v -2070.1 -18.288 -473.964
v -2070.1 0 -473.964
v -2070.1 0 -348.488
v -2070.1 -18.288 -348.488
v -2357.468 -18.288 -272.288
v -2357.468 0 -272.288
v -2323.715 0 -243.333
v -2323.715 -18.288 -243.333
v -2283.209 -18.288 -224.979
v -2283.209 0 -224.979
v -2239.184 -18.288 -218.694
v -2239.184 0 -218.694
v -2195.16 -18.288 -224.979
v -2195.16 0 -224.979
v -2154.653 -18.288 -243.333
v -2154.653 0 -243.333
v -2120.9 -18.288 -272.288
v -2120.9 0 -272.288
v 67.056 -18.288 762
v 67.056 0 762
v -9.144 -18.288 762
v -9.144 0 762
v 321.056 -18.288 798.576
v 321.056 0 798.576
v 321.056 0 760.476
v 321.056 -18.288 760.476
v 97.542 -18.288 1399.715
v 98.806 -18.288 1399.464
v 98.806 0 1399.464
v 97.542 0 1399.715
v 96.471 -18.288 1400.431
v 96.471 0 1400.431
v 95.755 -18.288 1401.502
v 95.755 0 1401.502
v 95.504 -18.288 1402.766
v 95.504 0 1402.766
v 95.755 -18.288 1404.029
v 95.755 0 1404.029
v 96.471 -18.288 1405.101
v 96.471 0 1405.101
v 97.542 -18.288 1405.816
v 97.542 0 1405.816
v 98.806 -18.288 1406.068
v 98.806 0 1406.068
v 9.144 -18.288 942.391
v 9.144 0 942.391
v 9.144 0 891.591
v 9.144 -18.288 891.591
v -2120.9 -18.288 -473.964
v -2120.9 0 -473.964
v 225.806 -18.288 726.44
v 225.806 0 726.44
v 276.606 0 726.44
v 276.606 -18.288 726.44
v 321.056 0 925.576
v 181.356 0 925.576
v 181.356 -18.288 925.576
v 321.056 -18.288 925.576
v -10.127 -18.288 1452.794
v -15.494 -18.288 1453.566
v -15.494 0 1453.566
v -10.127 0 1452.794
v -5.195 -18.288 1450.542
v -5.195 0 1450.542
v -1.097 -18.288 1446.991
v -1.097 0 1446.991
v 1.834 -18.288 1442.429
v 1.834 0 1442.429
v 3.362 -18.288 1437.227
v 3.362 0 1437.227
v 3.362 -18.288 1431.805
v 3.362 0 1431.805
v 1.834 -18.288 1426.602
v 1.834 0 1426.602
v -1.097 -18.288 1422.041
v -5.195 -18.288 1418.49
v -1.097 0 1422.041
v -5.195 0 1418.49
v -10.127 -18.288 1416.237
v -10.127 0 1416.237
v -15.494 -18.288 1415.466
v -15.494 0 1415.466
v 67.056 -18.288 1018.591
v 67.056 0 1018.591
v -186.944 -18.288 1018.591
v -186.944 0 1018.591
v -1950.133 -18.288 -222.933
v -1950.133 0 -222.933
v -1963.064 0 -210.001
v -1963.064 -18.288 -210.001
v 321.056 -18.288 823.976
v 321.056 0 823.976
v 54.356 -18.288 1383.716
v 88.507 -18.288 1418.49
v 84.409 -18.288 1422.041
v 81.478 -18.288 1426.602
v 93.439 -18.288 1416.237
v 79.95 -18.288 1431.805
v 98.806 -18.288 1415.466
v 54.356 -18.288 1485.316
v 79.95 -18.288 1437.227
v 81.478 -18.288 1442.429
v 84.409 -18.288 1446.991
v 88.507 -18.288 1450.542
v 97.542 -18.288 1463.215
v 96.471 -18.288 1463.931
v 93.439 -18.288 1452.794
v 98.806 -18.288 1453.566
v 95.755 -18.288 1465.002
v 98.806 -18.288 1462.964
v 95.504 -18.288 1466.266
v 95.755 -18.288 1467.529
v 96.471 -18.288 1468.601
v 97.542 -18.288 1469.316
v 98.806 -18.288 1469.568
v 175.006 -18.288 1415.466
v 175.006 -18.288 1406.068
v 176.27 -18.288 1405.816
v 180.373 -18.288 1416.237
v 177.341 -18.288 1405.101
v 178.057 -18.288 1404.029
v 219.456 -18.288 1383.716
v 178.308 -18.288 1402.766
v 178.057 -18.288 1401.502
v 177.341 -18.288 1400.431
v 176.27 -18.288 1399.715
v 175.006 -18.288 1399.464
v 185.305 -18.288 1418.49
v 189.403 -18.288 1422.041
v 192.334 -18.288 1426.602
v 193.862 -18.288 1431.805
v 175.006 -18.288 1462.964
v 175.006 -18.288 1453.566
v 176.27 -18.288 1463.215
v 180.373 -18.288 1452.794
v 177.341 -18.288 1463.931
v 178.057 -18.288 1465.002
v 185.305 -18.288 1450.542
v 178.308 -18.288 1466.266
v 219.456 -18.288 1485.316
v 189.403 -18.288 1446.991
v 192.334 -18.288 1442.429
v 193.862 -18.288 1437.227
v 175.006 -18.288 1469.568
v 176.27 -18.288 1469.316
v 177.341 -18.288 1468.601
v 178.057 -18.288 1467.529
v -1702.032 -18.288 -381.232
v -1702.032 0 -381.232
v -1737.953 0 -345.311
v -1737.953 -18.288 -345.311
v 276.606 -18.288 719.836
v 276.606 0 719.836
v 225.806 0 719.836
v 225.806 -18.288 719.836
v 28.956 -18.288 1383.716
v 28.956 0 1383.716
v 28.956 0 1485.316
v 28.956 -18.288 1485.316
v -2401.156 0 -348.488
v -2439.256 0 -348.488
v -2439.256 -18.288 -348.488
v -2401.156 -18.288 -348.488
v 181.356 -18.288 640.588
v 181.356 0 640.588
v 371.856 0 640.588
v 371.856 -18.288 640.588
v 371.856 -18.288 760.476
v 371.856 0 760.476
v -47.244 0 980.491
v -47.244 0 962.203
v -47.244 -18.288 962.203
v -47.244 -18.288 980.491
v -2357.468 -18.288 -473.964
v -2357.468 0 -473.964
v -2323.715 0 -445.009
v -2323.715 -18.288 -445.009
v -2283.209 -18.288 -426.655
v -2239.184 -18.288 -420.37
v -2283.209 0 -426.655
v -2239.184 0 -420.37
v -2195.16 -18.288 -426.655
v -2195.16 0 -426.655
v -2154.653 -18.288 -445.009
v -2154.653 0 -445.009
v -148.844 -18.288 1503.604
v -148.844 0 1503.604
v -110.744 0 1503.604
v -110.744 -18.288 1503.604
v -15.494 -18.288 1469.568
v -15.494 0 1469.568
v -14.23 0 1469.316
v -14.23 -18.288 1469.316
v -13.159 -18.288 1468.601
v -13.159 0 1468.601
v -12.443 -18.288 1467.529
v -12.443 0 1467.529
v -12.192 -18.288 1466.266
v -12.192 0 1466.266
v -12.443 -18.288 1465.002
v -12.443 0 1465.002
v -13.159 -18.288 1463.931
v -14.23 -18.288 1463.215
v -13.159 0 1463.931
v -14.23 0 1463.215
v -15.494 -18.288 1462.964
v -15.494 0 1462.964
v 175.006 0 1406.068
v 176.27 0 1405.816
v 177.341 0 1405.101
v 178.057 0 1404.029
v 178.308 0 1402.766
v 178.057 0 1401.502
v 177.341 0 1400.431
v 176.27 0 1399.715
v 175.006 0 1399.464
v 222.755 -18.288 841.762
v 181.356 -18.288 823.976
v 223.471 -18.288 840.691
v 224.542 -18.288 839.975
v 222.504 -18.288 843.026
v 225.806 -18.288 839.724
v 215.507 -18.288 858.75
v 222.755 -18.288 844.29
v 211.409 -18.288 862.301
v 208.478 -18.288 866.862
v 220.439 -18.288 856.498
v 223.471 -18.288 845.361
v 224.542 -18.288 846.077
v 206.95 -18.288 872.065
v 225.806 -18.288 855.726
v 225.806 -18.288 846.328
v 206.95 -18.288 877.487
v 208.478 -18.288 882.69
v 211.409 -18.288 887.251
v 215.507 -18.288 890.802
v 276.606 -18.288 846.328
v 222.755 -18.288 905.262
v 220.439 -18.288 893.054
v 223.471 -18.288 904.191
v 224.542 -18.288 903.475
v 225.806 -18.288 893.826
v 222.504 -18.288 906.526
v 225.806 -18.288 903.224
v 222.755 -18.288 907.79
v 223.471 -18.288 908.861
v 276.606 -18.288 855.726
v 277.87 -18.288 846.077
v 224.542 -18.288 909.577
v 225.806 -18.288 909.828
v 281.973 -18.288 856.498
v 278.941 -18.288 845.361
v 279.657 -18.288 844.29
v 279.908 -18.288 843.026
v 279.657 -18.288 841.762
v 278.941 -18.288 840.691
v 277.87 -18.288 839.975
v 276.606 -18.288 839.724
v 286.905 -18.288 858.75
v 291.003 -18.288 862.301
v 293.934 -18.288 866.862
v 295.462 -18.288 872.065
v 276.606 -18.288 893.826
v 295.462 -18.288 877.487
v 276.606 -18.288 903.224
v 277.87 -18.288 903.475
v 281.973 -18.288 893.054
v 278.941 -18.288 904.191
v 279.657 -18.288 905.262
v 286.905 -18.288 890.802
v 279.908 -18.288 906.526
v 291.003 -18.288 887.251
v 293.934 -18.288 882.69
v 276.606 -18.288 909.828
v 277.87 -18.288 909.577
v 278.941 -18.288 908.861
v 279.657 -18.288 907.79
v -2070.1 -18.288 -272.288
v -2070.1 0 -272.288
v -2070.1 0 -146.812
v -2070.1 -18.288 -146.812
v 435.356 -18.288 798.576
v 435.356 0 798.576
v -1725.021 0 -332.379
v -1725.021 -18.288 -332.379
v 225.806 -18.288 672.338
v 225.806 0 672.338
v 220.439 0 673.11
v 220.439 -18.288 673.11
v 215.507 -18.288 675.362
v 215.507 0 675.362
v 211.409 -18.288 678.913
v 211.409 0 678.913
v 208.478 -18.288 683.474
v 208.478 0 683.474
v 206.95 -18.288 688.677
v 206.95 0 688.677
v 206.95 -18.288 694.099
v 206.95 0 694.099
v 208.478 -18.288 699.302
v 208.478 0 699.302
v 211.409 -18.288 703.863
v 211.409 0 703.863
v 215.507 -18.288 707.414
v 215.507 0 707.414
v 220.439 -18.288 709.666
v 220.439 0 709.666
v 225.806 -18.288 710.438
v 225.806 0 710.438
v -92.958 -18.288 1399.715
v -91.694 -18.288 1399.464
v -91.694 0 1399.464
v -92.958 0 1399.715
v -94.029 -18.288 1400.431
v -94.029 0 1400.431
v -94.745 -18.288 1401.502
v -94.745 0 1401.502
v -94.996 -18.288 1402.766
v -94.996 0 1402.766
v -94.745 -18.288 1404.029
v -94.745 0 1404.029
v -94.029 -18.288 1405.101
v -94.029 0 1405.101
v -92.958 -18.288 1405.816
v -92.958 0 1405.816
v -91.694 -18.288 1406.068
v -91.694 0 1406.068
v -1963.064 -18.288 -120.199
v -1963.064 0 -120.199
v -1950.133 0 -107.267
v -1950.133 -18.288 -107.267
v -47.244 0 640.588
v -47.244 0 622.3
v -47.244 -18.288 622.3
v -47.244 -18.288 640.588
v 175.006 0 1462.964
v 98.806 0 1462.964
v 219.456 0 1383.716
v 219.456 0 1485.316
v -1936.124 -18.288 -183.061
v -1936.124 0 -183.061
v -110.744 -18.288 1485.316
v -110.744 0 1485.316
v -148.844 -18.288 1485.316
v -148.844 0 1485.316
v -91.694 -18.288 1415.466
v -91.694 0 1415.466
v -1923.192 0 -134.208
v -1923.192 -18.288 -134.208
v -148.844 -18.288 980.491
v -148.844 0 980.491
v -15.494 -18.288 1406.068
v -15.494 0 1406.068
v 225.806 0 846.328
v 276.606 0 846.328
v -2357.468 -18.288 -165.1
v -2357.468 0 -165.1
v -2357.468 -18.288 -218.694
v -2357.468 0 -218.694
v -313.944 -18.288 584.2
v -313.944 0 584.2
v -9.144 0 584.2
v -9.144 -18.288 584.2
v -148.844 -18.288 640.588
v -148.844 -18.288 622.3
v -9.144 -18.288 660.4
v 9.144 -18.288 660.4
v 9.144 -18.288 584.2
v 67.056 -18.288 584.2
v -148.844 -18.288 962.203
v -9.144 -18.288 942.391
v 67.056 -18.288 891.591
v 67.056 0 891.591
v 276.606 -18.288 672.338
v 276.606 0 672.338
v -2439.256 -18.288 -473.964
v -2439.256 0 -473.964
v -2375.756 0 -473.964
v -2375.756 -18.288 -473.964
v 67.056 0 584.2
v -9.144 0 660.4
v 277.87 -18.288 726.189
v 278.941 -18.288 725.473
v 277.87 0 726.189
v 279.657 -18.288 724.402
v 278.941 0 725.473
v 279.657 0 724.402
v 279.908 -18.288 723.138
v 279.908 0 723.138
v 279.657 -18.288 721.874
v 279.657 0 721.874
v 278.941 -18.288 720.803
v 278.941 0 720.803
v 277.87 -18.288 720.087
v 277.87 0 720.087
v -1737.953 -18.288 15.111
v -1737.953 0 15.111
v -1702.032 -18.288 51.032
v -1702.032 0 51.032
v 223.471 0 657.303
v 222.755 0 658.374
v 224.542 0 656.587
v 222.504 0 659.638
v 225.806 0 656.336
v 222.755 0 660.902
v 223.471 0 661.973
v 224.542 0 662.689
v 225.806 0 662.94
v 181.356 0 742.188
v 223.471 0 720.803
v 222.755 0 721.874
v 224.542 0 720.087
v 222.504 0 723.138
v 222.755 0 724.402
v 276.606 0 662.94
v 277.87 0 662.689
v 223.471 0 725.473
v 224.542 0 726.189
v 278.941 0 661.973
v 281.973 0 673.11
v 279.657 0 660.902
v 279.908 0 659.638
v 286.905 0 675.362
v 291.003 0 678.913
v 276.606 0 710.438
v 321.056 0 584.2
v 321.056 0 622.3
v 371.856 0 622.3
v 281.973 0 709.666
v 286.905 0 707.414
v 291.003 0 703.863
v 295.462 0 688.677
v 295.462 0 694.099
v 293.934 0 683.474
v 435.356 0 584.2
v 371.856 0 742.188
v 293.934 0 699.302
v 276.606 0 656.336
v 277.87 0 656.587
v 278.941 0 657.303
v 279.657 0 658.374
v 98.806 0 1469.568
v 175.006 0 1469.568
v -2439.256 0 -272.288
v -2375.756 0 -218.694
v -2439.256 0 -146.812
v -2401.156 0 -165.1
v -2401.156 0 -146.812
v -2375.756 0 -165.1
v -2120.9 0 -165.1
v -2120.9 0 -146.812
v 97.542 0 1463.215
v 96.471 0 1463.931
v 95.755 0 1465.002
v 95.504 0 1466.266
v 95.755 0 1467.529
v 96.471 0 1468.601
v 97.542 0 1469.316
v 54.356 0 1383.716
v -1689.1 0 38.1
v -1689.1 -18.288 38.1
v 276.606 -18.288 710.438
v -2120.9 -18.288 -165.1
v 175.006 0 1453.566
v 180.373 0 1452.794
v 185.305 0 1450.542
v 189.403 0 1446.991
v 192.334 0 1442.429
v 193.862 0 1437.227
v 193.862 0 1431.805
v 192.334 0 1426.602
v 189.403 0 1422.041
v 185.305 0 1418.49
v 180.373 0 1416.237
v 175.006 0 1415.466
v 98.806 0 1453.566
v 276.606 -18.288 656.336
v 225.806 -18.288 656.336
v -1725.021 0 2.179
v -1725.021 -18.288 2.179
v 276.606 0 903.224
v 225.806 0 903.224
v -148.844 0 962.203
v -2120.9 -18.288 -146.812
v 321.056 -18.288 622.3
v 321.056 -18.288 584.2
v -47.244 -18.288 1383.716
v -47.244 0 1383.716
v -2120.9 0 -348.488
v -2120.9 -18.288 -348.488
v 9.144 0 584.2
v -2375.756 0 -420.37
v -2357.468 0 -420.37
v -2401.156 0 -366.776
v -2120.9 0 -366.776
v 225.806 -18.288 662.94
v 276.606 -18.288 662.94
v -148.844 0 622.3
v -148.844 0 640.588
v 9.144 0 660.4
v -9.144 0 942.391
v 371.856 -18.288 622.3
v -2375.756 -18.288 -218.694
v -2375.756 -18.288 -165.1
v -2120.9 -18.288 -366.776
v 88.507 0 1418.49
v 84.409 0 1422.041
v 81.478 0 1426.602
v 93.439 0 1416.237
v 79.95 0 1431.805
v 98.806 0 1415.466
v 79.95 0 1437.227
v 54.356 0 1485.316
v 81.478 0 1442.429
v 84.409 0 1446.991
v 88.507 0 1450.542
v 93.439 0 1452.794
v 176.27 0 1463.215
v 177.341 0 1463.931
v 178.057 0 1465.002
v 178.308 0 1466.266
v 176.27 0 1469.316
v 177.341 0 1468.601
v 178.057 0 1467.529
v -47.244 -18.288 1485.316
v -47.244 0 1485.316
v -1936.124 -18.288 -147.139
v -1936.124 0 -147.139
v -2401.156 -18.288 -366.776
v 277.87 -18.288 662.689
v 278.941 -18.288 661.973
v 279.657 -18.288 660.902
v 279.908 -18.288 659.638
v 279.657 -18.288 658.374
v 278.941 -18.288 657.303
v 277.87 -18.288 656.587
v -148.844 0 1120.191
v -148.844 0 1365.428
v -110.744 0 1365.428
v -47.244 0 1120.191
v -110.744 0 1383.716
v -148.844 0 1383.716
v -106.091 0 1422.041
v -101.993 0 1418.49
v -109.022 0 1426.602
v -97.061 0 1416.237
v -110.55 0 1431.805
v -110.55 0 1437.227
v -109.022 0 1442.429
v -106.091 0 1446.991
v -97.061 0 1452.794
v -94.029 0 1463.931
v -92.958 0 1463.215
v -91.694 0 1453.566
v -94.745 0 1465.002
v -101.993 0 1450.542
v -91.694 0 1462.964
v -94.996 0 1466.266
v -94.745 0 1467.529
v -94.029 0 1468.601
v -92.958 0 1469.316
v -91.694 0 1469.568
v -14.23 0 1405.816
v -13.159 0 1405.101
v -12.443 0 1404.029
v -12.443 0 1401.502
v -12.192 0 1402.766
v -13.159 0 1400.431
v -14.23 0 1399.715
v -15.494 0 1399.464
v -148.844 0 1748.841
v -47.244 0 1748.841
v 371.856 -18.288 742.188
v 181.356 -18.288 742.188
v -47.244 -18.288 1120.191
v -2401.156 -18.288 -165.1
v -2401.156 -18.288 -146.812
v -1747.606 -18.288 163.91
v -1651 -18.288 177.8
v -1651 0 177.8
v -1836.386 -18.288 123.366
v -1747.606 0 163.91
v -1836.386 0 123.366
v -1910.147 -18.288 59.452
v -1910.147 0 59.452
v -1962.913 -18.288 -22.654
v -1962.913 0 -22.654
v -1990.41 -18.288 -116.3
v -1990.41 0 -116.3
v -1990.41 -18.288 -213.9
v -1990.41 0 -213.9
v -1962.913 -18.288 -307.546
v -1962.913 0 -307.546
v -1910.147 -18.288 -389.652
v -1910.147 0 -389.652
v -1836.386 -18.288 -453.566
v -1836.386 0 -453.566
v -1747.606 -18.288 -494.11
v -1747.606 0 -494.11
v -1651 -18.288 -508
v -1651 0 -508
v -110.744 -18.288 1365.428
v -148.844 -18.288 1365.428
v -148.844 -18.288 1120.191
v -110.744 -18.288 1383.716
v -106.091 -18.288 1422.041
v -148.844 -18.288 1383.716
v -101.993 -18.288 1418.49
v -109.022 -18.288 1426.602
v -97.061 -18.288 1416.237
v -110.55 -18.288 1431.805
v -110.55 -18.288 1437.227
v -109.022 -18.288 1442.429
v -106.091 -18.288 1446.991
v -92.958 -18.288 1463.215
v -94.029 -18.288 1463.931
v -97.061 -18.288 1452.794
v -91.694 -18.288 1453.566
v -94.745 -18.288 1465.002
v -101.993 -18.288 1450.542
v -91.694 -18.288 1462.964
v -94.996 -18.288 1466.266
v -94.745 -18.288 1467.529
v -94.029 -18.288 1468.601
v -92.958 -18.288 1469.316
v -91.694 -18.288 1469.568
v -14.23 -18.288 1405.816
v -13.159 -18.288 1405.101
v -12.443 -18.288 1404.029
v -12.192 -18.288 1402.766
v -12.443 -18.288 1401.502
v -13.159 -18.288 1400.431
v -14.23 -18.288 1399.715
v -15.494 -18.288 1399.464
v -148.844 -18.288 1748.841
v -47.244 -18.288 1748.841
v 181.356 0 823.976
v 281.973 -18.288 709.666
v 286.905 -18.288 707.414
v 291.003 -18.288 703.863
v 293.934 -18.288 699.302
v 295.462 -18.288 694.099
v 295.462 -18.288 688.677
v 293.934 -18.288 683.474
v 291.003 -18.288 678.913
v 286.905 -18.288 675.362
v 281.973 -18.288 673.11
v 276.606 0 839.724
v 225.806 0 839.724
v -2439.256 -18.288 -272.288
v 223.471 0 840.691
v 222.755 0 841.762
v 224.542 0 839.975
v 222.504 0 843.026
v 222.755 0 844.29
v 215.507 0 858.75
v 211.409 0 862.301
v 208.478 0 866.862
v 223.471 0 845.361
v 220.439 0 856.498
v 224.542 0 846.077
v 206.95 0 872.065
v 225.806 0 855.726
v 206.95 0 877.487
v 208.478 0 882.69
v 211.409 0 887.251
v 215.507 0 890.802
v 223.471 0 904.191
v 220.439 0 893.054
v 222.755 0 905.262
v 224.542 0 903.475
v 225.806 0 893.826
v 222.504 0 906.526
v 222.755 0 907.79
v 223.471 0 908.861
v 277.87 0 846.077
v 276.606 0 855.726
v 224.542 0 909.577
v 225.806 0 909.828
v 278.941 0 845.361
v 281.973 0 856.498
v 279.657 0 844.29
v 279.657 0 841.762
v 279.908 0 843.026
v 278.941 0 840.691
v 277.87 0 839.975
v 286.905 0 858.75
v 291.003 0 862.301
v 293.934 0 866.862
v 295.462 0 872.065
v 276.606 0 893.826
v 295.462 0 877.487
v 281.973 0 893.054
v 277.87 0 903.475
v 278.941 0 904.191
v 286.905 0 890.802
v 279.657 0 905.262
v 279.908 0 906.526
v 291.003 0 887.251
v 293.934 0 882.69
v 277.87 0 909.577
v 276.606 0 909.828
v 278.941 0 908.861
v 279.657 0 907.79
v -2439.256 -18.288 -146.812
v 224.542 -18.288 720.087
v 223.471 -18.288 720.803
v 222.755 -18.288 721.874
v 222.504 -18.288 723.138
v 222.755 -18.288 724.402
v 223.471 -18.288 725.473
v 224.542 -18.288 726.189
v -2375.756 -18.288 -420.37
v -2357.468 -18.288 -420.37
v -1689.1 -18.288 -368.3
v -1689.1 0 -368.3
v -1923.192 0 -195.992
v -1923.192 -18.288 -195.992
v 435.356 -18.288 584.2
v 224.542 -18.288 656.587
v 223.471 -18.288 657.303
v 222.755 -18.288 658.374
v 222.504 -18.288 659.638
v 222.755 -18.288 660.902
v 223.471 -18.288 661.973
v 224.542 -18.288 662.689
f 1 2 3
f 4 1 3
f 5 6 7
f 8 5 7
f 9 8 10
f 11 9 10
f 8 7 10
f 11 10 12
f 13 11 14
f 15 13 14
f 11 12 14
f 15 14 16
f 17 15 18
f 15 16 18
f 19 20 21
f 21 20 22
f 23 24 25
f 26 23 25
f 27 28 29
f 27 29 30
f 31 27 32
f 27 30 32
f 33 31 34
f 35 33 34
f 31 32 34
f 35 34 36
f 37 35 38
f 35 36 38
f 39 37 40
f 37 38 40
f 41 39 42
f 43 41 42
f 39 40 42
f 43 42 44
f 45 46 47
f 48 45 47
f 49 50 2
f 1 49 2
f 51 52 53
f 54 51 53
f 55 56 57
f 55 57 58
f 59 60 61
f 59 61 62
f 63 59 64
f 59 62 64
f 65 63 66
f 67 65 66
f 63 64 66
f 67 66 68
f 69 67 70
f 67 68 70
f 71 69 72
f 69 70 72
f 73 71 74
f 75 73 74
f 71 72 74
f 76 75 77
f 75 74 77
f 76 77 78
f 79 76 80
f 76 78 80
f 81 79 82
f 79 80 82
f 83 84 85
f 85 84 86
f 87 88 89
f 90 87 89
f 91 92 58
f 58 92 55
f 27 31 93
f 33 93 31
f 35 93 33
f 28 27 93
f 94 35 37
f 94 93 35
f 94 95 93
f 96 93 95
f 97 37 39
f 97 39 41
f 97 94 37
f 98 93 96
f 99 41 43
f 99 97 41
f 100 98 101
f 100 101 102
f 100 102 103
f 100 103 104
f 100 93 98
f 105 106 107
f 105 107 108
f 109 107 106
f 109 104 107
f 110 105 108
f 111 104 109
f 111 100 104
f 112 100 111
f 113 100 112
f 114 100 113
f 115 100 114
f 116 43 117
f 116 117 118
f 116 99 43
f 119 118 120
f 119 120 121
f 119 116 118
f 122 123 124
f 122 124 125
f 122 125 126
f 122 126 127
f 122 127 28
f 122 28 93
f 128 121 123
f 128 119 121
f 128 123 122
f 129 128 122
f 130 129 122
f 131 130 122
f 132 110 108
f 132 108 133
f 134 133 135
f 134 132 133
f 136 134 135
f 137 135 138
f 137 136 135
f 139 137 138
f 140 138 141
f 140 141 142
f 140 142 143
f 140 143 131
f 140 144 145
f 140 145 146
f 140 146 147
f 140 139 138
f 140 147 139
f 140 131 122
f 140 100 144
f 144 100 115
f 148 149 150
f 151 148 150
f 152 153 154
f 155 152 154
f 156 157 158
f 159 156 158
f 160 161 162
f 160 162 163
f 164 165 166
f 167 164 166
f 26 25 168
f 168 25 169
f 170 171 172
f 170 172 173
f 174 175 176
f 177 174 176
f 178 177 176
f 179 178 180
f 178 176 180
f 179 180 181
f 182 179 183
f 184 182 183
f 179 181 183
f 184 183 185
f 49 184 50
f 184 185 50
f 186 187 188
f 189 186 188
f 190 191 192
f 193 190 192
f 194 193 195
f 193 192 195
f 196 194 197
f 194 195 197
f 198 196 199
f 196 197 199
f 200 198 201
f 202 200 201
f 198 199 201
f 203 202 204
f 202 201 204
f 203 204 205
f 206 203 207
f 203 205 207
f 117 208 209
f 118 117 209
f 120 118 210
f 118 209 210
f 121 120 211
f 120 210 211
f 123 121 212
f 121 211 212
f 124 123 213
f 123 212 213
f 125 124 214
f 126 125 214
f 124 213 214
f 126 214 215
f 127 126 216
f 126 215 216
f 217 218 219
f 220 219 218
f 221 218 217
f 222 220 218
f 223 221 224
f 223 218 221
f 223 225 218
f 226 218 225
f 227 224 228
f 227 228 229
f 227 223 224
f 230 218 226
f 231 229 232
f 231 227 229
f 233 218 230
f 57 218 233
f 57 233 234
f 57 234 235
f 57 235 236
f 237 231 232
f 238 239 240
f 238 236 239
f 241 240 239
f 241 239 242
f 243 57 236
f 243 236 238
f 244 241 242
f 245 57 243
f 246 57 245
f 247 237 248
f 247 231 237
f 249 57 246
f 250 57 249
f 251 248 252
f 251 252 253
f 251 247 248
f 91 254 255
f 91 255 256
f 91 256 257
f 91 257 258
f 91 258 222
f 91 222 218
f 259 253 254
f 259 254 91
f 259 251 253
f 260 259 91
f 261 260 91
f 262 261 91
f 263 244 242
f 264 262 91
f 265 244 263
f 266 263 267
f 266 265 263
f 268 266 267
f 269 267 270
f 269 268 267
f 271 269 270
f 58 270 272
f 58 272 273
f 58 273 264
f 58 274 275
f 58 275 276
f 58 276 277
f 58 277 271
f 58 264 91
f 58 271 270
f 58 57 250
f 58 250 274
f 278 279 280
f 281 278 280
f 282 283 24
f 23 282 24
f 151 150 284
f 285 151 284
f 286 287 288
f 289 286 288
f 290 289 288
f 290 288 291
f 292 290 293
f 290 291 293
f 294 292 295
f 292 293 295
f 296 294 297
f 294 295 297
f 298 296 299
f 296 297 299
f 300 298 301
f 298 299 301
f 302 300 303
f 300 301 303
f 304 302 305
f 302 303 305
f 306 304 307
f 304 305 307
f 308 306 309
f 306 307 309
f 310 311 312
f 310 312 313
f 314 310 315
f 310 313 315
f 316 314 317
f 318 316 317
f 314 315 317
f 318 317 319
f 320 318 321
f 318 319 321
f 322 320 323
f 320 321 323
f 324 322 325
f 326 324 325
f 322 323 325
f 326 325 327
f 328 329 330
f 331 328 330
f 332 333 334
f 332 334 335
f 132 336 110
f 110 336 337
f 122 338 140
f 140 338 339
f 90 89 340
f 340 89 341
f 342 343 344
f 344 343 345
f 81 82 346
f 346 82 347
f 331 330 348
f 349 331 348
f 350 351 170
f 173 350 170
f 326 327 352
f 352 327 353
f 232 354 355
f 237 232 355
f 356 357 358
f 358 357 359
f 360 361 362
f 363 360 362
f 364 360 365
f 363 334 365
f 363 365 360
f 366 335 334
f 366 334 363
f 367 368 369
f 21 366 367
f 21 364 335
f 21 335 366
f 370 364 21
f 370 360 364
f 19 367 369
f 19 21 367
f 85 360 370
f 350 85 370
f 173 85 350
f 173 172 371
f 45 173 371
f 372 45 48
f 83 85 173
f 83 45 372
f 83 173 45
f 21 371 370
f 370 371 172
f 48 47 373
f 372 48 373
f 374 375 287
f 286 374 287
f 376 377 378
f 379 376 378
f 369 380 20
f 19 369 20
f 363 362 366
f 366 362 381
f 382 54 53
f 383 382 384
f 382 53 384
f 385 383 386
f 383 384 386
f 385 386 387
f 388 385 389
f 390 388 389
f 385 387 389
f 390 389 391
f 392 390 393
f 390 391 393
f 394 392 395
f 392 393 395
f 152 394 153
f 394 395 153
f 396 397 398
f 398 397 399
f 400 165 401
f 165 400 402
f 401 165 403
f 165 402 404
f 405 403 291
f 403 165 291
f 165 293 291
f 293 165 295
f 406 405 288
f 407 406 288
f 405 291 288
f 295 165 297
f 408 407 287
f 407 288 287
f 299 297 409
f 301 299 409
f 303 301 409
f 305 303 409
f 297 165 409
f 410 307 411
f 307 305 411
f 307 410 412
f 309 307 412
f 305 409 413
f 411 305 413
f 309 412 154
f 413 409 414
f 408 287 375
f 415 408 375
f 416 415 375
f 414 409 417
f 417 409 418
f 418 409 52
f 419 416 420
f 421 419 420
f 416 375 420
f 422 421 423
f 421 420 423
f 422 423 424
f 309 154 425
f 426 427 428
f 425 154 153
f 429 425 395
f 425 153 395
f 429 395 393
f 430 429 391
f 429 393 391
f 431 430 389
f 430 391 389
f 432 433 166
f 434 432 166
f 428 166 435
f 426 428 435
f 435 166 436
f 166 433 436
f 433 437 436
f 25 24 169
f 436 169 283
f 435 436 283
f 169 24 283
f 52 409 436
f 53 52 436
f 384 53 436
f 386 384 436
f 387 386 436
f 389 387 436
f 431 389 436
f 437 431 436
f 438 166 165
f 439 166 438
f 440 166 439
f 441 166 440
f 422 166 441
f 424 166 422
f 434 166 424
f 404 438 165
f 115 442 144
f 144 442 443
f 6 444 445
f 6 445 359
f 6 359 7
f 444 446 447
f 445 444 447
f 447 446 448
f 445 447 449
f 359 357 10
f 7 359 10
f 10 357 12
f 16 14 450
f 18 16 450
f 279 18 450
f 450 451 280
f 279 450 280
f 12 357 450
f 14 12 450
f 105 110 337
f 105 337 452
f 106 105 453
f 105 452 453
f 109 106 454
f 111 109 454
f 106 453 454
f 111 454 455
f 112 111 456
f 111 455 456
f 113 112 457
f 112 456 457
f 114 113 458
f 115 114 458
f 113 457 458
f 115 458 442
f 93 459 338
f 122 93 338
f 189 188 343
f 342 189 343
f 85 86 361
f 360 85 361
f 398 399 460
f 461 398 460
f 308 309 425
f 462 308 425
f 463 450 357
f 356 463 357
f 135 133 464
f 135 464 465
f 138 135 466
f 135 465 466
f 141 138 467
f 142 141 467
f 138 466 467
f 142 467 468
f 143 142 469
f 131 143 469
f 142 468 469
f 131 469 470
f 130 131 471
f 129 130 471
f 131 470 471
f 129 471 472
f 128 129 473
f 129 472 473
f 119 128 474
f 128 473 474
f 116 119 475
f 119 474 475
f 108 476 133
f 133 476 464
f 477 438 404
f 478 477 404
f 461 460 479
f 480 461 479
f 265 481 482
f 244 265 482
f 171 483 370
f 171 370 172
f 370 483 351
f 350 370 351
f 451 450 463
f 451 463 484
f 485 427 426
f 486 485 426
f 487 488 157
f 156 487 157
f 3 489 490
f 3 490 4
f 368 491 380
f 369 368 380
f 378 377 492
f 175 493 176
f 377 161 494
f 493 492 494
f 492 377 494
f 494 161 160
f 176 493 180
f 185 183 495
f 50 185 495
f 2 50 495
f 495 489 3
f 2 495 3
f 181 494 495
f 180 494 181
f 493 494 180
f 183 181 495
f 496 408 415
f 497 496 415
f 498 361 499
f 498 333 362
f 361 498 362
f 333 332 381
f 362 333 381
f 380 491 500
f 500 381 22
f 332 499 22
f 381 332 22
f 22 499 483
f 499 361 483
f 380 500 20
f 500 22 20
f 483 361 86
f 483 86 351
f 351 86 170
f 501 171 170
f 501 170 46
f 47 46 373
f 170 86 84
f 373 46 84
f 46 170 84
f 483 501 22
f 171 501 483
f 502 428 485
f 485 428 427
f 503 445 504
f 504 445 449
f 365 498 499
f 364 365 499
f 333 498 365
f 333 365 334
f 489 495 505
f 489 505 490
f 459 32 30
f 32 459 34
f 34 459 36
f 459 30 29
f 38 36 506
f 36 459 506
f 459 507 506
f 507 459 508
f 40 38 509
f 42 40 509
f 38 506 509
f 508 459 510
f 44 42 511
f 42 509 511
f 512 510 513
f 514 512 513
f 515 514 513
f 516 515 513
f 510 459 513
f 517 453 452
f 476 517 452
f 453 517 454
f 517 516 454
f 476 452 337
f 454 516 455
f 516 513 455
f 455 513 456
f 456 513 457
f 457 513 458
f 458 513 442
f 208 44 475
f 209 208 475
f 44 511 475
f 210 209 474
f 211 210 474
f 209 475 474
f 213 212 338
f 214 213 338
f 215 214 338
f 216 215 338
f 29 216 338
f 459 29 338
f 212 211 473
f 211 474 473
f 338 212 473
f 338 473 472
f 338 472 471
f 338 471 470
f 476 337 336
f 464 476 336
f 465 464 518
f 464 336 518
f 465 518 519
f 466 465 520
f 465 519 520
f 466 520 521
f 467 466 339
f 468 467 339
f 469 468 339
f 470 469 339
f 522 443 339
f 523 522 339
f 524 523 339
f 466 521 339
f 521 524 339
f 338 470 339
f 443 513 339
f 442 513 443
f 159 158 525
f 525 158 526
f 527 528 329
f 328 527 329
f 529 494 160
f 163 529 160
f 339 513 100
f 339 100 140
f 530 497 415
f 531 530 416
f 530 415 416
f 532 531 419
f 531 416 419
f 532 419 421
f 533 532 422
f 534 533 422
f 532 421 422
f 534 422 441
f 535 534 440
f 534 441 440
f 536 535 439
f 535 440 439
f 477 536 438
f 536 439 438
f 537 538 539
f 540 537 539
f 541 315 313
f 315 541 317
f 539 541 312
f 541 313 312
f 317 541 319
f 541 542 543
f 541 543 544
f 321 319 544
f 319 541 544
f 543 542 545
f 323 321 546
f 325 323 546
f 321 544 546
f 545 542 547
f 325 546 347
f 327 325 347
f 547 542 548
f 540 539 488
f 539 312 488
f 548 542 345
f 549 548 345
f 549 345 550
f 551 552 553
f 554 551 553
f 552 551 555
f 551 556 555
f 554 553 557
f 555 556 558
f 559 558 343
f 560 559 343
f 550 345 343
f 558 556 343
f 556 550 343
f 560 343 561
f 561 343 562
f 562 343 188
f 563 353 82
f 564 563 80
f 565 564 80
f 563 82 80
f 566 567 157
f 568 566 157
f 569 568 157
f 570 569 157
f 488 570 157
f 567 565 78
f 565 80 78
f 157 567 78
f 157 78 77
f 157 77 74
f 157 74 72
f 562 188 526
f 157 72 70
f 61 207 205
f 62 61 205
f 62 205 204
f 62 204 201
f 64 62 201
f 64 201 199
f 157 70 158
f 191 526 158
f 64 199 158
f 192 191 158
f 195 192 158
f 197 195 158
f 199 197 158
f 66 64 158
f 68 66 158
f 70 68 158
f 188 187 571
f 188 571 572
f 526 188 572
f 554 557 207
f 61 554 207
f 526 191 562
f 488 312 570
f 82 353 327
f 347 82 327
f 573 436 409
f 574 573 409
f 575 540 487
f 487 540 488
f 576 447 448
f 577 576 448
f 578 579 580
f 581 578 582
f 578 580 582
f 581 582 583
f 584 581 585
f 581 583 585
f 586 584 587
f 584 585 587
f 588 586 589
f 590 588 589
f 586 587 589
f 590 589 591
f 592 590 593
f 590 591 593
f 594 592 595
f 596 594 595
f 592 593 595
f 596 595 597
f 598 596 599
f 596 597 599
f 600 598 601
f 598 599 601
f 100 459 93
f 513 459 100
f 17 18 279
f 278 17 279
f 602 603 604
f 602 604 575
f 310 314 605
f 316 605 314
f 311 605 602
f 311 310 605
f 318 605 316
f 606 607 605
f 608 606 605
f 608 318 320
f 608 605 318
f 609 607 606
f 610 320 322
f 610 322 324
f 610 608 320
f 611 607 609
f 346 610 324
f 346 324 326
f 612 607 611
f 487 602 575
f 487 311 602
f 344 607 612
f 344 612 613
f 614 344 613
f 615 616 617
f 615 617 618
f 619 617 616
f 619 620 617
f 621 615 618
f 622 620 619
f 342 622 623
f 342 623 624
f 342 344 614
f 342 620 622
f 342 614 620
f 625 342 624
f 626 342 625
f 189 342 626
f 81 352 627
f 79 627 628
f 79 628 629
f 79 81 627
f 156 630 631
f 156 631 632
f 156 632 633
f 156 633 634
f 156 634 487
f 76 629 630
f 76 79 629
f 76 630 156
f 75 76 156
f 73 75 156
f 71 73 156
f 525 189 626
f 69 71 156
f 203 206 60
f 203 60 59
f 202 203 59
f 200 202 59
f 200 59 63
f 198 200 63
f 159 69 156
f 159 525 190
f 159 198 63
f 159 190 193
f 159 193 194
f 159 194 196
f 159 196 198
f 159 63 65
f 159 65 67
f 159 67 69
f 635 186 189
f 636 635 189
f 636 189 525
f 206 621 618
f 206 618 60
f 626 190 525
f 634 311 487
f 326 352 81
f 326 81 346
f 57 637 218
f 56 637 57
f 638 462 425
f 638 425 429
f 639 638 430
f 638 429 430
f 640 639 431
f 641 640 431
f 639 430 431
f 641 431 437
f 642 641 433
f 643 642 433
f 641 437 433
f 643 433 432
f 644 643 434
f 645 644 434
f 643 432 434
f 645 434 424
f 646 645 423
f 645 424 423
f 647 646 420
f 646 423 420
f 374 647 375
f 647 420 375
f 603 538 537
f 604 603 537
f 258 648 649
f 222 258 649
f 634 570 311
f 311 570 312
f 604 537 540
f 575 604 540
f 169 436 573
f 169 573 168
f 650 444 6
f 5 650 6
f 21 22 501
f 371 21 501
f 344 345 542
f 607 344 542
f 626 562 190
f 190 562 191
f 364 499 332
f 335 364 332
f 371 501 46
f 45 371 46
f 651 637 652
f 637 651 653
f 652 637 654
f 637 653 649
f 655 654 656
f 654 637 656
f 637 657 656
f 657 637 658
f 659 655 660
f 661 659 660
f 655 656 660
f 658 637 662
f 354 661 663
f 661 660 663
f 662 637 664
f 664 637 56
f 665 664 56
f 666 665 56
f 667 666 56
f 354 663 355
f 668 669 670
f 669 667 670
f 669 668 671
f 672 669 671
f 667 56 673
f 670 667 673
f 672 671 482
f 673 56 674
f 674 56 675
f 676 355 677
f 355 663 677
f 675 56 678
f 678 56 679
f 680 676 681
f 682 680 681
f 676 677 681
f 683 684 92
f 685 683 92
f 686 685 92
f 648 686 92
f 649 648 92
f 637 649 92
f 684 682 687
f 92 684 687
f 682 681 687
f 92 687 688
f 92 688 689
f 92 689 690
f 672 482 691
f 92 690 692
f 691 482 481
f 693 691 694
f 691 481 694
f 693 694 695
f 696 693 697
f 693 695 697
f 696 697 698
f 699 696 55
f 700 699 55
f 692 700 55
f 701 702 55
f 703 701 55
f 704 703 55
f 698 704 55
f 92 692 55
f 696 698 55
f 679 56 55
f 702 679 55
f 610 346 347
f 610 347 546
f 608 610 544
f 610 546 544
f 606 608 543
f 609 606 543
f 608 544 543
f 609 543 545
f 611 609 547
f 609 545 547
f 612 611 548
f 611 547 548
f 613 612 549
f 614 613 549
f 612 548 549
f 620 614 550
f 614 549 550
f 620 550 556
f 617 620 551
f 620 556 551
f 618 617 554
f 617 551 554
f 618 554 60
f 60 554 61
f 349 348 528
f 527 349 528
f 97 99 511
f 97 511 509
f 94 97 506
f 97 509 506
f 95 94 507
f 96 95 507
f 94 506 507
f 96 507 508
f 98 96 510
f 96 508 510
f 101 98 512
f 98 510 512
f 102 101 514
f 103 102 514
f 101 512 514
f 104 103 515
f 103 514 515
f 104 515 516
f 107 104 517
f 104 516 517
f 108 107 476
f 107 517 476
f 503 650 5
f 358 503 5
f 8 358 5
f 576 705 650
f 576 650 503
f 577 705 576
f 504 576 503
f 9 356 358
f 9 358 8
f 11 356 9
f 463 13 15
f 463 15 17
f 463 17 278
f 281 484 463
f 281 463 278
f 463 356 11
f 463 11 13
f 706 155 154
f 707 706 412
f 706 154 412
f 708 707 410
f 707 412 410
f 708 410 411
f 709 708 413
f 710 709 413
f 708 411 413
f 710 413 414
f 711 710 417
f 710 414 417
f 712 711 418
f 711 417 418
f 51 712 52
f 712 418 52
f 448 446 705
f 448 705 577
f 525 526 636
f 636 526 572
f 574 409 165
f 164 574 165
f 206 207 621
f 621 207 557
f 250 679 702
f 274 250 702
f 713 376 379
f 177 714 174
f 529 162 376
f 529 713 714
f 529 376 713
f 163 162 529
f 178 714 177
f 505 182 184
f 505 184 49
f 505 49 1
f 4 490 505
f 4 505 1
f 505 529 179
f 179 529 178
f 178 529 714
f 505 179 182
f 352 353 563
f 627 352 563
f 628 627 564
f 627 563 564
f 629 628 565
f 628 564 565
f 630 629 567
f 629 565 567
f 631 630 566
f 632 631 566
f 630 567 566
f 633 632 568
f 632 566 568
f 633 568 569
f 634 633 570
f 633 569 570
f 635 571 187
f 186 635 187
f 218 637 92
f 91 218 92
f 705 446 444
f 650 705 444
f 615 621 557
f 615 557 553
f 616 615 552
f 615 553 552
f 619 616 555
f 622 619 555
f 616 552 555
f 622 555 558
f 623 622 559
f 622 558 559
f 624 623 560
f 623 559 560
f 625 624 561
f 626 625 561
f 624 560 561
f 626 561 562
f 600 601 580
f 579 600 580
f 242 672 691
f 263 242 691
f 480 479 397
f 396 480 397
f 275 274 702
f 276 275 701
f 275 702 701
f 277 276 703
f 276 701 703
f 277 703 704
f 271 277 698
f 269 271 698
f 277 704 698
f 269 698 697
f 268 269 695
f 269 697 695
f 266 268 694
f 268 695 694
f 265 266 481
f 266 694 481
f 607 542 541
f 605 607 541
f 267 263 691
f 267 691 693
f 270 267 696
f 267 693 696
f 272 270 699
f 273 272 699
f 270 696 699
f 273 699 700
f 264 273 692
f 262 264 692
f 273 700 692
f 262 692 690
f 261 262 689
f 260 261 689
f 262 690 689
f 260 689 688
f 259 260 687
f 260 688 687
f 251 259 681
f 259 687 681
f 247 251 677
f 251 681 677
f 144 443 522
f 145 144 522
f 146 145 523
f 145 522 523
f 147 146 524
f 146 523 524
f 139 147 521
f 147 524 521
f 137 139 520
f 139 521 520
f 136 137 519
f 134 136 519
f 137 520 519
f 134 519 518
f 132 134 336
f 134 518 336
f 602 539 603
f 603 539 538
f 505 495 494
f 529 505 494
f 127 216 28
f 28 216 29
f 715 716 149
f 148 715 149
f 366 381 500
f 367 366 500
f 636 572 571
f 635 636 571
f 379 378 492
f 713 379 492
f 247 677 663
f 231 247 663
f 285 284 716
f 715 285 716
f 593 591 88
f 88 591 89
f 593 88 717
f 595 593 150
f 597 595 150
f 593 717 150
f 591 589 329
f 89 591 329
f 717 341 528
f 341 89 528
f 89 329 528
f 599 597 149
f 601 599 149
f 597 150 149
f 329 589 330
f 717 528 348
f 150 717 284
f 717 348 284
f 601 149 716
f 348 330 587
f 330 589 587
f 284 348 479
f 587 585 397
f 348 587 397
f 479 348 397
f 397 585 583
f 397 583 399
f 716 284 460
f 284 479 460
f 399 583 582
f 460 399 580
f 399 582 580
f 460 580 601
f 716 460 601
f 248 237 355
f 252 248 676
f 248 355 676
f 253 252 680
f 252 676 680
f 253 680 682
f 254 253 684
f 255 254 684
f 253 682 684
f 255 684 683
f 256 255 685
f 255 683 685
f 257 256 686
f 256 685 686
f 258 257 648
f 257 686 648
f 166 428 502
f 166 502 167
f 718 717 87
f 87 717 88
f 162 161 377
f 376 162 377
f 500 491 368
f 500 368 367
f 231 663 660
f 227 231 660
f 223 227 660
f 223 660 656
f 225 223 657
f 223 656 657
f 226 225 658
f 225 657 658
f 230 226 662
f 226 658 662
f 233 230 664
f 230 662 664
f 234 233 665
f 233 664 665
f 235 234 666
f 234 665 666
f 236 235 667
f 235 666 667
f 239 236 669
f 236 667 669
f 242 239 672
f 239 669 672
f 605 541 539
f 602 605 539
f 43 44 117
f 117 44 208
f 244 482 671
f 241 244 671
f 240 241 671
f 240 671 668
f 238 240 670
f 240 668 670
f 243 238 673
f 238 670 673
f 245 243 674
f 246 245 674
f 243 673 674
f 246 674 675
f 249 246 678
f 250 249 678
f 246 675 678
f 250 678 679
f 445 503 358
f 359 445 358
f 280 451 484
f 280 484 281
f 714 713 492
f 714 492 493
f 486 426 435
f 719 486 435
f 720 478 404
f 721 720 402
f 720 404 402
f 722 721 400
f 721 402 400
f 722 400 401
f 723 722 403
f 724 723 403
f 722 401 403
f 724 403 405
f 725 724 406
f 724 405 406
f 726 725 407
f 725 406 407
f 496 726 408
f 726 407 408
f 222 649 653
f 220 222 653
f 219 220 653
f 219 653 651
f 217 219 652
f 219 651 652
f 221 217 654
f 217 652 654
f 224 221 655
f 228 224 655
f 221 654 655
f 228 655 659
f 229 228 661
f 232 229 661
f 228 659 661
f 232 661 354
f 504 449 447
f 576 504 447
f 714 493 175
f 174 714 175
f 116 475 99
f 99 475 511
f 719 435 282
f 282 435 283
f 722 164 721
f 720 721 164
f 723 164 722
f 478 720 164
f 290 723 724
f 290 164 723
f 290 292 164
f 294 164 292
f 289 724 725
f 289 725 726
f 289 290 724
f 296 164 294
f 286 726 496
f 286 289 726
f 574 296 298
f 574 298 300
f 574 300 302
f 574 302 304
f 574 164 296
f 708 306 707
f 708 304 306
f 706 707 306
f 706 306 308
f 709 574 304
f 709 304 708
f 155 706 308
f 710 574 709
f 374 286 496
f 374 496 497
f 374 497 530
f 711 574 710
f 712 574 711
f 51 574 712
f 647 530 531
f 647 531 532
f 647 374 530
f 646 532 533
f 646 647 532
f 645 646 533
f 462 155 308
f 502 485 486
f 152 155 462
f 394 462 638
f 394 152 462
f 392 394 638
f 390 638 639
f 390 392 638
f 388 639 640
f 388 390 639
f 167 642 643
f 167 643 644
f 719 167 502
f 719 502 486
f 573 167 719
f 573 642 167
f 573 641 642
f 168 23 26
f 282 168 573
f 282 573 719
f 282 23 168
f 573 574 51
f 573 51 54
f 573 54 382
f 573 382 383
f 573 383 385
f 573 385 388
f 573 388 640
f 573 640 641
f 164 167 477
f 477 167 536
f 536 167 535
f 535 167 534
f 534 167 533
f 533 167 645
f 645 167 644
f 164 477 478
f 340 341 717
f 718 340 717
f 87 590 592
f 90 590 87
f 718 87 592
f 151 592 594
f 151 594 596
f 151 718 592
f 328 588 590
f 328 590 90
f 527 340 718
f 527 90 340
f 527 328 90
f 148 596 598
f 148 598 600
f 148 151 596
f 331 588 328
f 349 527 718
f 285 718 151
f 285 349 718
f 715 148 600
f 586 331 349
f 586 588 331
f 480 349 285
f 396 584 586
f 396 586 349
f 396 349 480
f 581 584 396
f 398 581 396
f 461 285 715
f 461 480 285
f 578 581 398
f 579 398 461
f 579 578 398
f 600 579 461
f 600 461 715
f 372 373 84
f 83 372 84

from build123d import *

# Parameters (mm, degrees)
F0_W     = 38.1
F0_H     = 18.288
F0_W_2   = 50.8
F0_W_3   = 18.288
F0_H_2   = 53.594
F1_DEPTH = 18.288
F0_W_4   = 101.6
F0_W_5   = 57.912
F0_H_3   = 76.2
F0_W_6   = 63.5
F0_W_7   = 139.7
F0_H_4   = 101.6
F0_W_8   = 165.1


# Not quite as in the source:
# - a feature names something its author has since deleted; it is built from what else it names


with BuildPart() as f1:
    # F0 (on Front) → F1 (new body)
    with BuildSketch(Plane.XZ):
        with Locations((-2420.2061958742, -155.956)):
            Rectangle(F0_W, F0_H)
        Polygon((-2401.1561958742, -165.1), (-2439.2561958742, -165.1), (-2439.2561958742, -272.288), (-2375.7561958742, -272.288), (-2375.7561958742, -218.694), (-2375.7561958742, -165.1), align=None)
        with BuildLine():
            Line((-2120.9, -165.1), (-2357.4681958742, -165.1))
            Line((-2357.4681958742, -165.1), (-2357.4681958742, -218.694))
            Line((-2357.4681958742, -218.694), (-2357.4681958742, -272.288))
            ThreePointArc((-2357.4681958742, -272.288), (-2239.1840979371, -218.694), (-2120.9, -272.288))
            Line((-2120.9, -272.288), (-2070.1, -272.288))
            Line((-2070.1, -272.288), (-2070.1, -165.1))
            Line((-2070.1, -165.1), (-2120.9, -165.1))
        make_face()
        with Locations((-2095.5, -155.956)):
            Rectangle(F0_W_2, F0_H)
        with Locations((-2366.6121958742, -245.491)):
            Rectangle(F0_W_3, F0_H_2)
    extrude(amount=F1_DEPTH)


with BuildPart() as f1b:
    # F0 (on Front) → F1, piece 2 (new body)
    with BuildSketch(Plane.XZ):
        with BuildLine():
            Line((-1651, -508), (-1651, 177.8))
            ThreePointArc((-1651, 177.8), (-1993.9, -165.1), (-1651, -508))
        make_face()
        Polygon((-1923.1920810565, -195.9920810565), (-1950.1328494197, -222.9328494197), (-1963.064418234, -210.0012806053), (-1936.1236498708, -183.0605122421), align=None, mode=Mode.SUBTRACT)
        Polygon((-1950.1328494197, -107.2671505803), (-1923.1920810565, -134.2079189435), (-1936.1236498708, -147.1394877579), (-1963.064418234, -120.1987193947), align=None, mode=Mode.SUBTRACT)
        Polygon((-1725.0210244843, -332.3789755157), (-1689.1, -368.3), (-1702.0315688143, -381.2315688143), (-1737.9525932986, -345.3105443301), align=None, mode=Mode.SUBTRACT)
        Polygon((-1702.0315688143, 51.0315688143), (-1689.1, 38.1), (-1725.0210244843, 2.1789755157), (-1737.9525932986, 15.1105443301), align=None, mode=Mode.SUBTRACT)
    extrude(amount=F1_DEPTH)


with BuildPart() as f1c:
    # F0 (on Front) → F1, piece 3 (new body)
    with BuildSketch(Plane.XZ):
        with Locations((-2420.2061958742, -357.632)):
            Rectangle(F0_W, F0_H)
        with BuildLine():
            Line((-2120.9, -366.776), (-2357.4681958742, -366.776))
            Line((-2357.4681958742, -366.776), (-2357.4681958742, -420.37))
            Line((-2357.4681958742, -420.37), (-2357.4681958742, -473.964))
            ThreePointArc((-2357.4681958742, -473.964), (-2239.1840979371, -420.37), (-2120.9, -473.964))
            Line((-2120.9, -473.964), (-2070.1, -473.964))
            Line((-2070.1, -473.964), (-2070.1, -366.776))
            Line((-2070.1, -366.776), (-2120.9, -366.776))
        make_face()
        with Locations((-2095.5, -357.632)):
            Rectangle(F0_W_2, F0_H)
        Polygon((-2401.1561958742, -366.776), (-2439.2561958742, -366.776), (-2439.2561958742, -473.964), (-2375.7561958742, -473.964), (-2375.7561958742, -420.37), (-2375.7561958742, -366.776), align=None)
        with Locations((-2366.6121958742, -393.573)):
            Rectangle(F0_W_3, F0_H_2)
    extrude(amount=F1_DEPTH)


with BuildPart() as f1d:
    # F0 (on Front) → F1, piece 4 (new body)
    with BuildSketch(Plane.XZ):
        Polygon((-98.044, 1503.6038), (-47.244, 1503.6038), (-47.244, 1748.8408), (-148.844, 1748.8408), (-148.844, 1503.6038), (-110.744, 1503.6038), align=None)
        Polygon((-98.044, 1485.3158), (-47.244, 1485.3158), (-47.244, 1503.6038), (-98.044, 1503.6038), (-110.744, 1503.6038), (-110.744, 1485.3158), align=None)
        Polygon((-98.044, 1383.7158), (-47.244, 1383.7158), (28.956, 1383.7158), (28.956, 1485.3158), (-47.244, 1485.3158), (-98.044, 1485.3158), (-110.744, 1485.3158), (-148.844, 1485.3158), (-148.844, 1383.7158), (-110.744, 1383.7158), align=None)
        with BuildLine():
            ThreePointArc((-91.694, 1399.4638), (-94.996, 1402.7658), (-91.694, 1406.0678))
            Line((-91.694, 1406.0678), (-15.494, 1406.0678))
            ThreePointArc((-15.494, 1406.0678), (-12.192, 1402.7658), (-15.494, 1399.4638))
            Line((-15.494, 1399.4638), (-91.694, 1399.4638))
        make_face(mode=Mode.SUBTRACT)
        with BuildLine():
            Line((-91.694, 1453.5658), (-15.494, 1453.5658))
            ThreePointArc((-15.494, 1453.5658), (3.556, 1434.5158), (-15.494, 1415.4658))
            Line((-15.494, 1415.4658), (-91.694, 1415.4658))
            ThreePointArc((-91.694, 1415.4658), (-110.744, 1434.5158), (-91.694, 1453.5658))
        make_face(mode=Mode.SUBTRACT)
        with BuildLine():
            Line((-15.494, 1462.9638), (-91.694, 1462.9638))
            ThreePointArc((-91.694, 1462.9638), (-94.996, 1466.2658), (-91.694, 1469.5678))
            Line((-91.694, 1469.5678), (-15.494, 1469.5678))
            ThreePointArc((-15.494, 1469.5678), (-12.192, 1466.2658), (-15.494, 1462.9638))
        make_face(mode=Mode.SUBTRACT)
        Polygon((-98.044, 1365.4278), (-47.244, 1365.4278), (-47.244, 1383.7158), (-98.044, 1383.7158), (-110.744, 1383.7158), (-110.744, 1365.4278), align=None)
        Polygon((-148.844, 1365.4278), (-148.844, 1120.1908), (-47.244, 1120.1908), (-47.244, 1365.4278), (-98.044, 1365.4278), (-110.744, 1365.4278), align=None)
    extrude(amount=F1_DEPTH)


with BuildPart() as f1e:
    # F0 (on Front) → F1, piece 5 (new body)
    with BuildSketch(Plane.XZ):
        Polygon((-9.144, 942.3908), (9.144, 942.3908), (9.144, 929.6908), (9.144, 891.5908), (67.056, 891.5908), (67.056, 929.6908), (67.056, 1018.5908), (-9.144, 1018.5908), (-186.944, 1018.5908), (-313.944, 584.2), (-9.144, 584.2), (-9.144, 660.4), (-9.144, 762), (-9.144, 929.6908), align=None)
        with Locations((-98.044, 631.444)):
            Rectangle(F0_W_4, F0_H, mode=Mode.SUBTRACT)
        with Locations((-98.044, 971.3468)):
            Rectangle(F0_W_4, F0_H, mode=Mode.SUBTRACT)
        Polygon((67.056, 762), (-9.144, 762), (-9.144, 660.4), (9.144, 660.4), (67.056, 660.4), align=None)
        with Locations((38.1, 622.3)):
            Rectangle(F0_W_5, F0_H_3)
    extrude(amount=F1_DEPTH)


with BuildPart() as f1f:
    # F0 (on Front) → F1, piece 6 (new body)
    with BuildSketch(Plane.XZ):
        Polygon((371.856, 760.476), (435.356, 760.476), (435.356, 798.576), (321.056, 798.576), (321.056, 760.476), align=None)
        with Locations((403.606, 751.332)):
            Rectangle(F0_W_6, F0_H)
        Polygon((181.356, 640.588), (371.856, 640.588), (435.356, 640.588), (435.356, 742.188), (371.856, 742.188), (181.356, 742.188), align=None)
        with BuildLine():
            ThreePointArc((276.606, 662.94), (279.908, 659.638), (276.606, 656.336))
            Line((276.606, 656.336), (225.806, 656.336))
            ThreePointArc((225.806, 656.336), (222.504, 659.638), (225.806, 662.94))
            Line((225.806, 662.94), (276.606, 662.94))
        make_face(mode=Mode.SUBTRACT)
        with BuildLine():
            Line((276.606, 672.338), (225.806, 672.338))
            ThreePointArc((225.806, 672.338), (206.756, 691.388), (225.806, 710.438))
            Line((225.806, 710.438), (276.606, 710.438))
            ThreePointArc((276.606, 710.438), (295.656, 691.388), (276.606, 672.338))
        make_face(mode=Mode.SUBTRACT)
        with BuildLine():
            Line((225.806, 726.44), (276.606, 726.44))
            ThreePointArc((276.606, 726.44), (279.908, 723.138), (276.606, 719.836))
            Line((276.606, 719.836), (225.806, 719.836))
            ThreePointArc((225.806, 719.836), (222.504, 723.138), (225.806, 726.44))
        make_face(mode=Mode.SUBTRACT)
        with Locations((403.606, 631.444)):
            Rectangle(F0_W_6, F0_H)
        Polygon((435.356, 622.3), (371.856, 622.3), (321.056, 622.3), (321.056, 584.2), (435.356, 584.2), align=None)
    extrude(amount=F1_DEPTH)


with BuildPart() as f1g:
    # F0 (on Front) → F1, piece 7 (new body)
    with BuildSketch(Plane.XZ):
        with Locations((251.206, 874.776)):
            Rectangle(F0_W_7, F0_H_4)
        with BuildLine():
            ThreePointArc((276.606, 846.328), (279.908, 843.026), (276.606, 839.724))
            Line((276.606, 839.724), (225.806, 839.724))
            ThreePointArc((225.806, 839.724), (222.504, 843.026), (225.806, 846.328))
            Line((225.806, 846.328), (276.606, 846.328))
        make_face(mode=Mode.SUBTRACT)
        with BuildLine():
            Line((276.606, 855.726), (225.806, 855.726))
            ThreePointArc((225.806, 855.726), (206.756, 874.776), (225.806, 893.826))
            Line((225.806, 893.826), (276.606, 893.826))
            ThreePointArc((276.606, 893.826), (295.656, 874.776), (276.606, 855.726))
        make_face(mode=Mode.SUBTRACT)
        with BuildLine():
            Line((276.606, 903.224), (225.806, 903.224))
            ThreePointArc((225.806, 903.224), (222.504, 906.526), (225.806, 909.828))
            Line((225.806, 909.828), (276.606, 909.828))
            ThreePointArc((276.606, 909.828), (279.908, 906.526), (276.606, 903.224))
        make_face(mode=Mode.SUBTRACT)
    extrude(amount=F1_DEPTH)


with BuildPart() as f1h:
    # F0 (on Front) → F1, piece 8 (new body)
    with BuildSketch(Plane.XZ):
        with Locations((136.906, 1434.5158)):
            Rectangle(F0_W_8, F0_H_4)
        with BuildLine():
            Line((98.806, 1406.0678), (175.006, 1406.0678))
            ThreePointArc((175.006, 1406.0678), (178.308, 1402.7658), (175.006, 1399.4638))
            Line((175.006, 1399.4638), (98.806, 1399.4638))
            ThreePointArc((98.806, 1399.4638), (95.504, 1402.7658), (98.806, 1406.0678))
        make_face(mode=Mode.SUBTRACT)
        with BuildLine():
            Line((175.006, 1415.4658), (98.806, 1415.4658))
            ThreePointArc((98.806, 1415.4658), (79.756, 1434.5158), (98.806, 1453.5658))
            Line((98.806, 1453.5658), (175.006, 1453.5658))
            ThreePointArc((175.006, 1453.5658), (194.056, 1434.5158), (175.006, 1415.4658))
        make_face(mode=Mode.SUBTRACT)
        with BuildLine():
            ThreePointArc((175.006, 1469.5678), (178.308, 1466.2658), (175.006, 1462.9638))
            Line((175.006, 1462.9638), (98.806, 1462.9638))
            ThreePointArc((98.806, 1462.9638), (95.504, 1466.2658), (98.806, 1469.5678))
            Line((98.806, 1469.5678), (175.006, 1469.5678))
        make_face(mode=Mode.SUBTRACT)
    extrude(amount=F1_DEPTH)


solid = Compound([f1.part, f1b.part, f1c.part, f1d.part, f1e.part, f1f.part, f1g.part, f1h.part])
